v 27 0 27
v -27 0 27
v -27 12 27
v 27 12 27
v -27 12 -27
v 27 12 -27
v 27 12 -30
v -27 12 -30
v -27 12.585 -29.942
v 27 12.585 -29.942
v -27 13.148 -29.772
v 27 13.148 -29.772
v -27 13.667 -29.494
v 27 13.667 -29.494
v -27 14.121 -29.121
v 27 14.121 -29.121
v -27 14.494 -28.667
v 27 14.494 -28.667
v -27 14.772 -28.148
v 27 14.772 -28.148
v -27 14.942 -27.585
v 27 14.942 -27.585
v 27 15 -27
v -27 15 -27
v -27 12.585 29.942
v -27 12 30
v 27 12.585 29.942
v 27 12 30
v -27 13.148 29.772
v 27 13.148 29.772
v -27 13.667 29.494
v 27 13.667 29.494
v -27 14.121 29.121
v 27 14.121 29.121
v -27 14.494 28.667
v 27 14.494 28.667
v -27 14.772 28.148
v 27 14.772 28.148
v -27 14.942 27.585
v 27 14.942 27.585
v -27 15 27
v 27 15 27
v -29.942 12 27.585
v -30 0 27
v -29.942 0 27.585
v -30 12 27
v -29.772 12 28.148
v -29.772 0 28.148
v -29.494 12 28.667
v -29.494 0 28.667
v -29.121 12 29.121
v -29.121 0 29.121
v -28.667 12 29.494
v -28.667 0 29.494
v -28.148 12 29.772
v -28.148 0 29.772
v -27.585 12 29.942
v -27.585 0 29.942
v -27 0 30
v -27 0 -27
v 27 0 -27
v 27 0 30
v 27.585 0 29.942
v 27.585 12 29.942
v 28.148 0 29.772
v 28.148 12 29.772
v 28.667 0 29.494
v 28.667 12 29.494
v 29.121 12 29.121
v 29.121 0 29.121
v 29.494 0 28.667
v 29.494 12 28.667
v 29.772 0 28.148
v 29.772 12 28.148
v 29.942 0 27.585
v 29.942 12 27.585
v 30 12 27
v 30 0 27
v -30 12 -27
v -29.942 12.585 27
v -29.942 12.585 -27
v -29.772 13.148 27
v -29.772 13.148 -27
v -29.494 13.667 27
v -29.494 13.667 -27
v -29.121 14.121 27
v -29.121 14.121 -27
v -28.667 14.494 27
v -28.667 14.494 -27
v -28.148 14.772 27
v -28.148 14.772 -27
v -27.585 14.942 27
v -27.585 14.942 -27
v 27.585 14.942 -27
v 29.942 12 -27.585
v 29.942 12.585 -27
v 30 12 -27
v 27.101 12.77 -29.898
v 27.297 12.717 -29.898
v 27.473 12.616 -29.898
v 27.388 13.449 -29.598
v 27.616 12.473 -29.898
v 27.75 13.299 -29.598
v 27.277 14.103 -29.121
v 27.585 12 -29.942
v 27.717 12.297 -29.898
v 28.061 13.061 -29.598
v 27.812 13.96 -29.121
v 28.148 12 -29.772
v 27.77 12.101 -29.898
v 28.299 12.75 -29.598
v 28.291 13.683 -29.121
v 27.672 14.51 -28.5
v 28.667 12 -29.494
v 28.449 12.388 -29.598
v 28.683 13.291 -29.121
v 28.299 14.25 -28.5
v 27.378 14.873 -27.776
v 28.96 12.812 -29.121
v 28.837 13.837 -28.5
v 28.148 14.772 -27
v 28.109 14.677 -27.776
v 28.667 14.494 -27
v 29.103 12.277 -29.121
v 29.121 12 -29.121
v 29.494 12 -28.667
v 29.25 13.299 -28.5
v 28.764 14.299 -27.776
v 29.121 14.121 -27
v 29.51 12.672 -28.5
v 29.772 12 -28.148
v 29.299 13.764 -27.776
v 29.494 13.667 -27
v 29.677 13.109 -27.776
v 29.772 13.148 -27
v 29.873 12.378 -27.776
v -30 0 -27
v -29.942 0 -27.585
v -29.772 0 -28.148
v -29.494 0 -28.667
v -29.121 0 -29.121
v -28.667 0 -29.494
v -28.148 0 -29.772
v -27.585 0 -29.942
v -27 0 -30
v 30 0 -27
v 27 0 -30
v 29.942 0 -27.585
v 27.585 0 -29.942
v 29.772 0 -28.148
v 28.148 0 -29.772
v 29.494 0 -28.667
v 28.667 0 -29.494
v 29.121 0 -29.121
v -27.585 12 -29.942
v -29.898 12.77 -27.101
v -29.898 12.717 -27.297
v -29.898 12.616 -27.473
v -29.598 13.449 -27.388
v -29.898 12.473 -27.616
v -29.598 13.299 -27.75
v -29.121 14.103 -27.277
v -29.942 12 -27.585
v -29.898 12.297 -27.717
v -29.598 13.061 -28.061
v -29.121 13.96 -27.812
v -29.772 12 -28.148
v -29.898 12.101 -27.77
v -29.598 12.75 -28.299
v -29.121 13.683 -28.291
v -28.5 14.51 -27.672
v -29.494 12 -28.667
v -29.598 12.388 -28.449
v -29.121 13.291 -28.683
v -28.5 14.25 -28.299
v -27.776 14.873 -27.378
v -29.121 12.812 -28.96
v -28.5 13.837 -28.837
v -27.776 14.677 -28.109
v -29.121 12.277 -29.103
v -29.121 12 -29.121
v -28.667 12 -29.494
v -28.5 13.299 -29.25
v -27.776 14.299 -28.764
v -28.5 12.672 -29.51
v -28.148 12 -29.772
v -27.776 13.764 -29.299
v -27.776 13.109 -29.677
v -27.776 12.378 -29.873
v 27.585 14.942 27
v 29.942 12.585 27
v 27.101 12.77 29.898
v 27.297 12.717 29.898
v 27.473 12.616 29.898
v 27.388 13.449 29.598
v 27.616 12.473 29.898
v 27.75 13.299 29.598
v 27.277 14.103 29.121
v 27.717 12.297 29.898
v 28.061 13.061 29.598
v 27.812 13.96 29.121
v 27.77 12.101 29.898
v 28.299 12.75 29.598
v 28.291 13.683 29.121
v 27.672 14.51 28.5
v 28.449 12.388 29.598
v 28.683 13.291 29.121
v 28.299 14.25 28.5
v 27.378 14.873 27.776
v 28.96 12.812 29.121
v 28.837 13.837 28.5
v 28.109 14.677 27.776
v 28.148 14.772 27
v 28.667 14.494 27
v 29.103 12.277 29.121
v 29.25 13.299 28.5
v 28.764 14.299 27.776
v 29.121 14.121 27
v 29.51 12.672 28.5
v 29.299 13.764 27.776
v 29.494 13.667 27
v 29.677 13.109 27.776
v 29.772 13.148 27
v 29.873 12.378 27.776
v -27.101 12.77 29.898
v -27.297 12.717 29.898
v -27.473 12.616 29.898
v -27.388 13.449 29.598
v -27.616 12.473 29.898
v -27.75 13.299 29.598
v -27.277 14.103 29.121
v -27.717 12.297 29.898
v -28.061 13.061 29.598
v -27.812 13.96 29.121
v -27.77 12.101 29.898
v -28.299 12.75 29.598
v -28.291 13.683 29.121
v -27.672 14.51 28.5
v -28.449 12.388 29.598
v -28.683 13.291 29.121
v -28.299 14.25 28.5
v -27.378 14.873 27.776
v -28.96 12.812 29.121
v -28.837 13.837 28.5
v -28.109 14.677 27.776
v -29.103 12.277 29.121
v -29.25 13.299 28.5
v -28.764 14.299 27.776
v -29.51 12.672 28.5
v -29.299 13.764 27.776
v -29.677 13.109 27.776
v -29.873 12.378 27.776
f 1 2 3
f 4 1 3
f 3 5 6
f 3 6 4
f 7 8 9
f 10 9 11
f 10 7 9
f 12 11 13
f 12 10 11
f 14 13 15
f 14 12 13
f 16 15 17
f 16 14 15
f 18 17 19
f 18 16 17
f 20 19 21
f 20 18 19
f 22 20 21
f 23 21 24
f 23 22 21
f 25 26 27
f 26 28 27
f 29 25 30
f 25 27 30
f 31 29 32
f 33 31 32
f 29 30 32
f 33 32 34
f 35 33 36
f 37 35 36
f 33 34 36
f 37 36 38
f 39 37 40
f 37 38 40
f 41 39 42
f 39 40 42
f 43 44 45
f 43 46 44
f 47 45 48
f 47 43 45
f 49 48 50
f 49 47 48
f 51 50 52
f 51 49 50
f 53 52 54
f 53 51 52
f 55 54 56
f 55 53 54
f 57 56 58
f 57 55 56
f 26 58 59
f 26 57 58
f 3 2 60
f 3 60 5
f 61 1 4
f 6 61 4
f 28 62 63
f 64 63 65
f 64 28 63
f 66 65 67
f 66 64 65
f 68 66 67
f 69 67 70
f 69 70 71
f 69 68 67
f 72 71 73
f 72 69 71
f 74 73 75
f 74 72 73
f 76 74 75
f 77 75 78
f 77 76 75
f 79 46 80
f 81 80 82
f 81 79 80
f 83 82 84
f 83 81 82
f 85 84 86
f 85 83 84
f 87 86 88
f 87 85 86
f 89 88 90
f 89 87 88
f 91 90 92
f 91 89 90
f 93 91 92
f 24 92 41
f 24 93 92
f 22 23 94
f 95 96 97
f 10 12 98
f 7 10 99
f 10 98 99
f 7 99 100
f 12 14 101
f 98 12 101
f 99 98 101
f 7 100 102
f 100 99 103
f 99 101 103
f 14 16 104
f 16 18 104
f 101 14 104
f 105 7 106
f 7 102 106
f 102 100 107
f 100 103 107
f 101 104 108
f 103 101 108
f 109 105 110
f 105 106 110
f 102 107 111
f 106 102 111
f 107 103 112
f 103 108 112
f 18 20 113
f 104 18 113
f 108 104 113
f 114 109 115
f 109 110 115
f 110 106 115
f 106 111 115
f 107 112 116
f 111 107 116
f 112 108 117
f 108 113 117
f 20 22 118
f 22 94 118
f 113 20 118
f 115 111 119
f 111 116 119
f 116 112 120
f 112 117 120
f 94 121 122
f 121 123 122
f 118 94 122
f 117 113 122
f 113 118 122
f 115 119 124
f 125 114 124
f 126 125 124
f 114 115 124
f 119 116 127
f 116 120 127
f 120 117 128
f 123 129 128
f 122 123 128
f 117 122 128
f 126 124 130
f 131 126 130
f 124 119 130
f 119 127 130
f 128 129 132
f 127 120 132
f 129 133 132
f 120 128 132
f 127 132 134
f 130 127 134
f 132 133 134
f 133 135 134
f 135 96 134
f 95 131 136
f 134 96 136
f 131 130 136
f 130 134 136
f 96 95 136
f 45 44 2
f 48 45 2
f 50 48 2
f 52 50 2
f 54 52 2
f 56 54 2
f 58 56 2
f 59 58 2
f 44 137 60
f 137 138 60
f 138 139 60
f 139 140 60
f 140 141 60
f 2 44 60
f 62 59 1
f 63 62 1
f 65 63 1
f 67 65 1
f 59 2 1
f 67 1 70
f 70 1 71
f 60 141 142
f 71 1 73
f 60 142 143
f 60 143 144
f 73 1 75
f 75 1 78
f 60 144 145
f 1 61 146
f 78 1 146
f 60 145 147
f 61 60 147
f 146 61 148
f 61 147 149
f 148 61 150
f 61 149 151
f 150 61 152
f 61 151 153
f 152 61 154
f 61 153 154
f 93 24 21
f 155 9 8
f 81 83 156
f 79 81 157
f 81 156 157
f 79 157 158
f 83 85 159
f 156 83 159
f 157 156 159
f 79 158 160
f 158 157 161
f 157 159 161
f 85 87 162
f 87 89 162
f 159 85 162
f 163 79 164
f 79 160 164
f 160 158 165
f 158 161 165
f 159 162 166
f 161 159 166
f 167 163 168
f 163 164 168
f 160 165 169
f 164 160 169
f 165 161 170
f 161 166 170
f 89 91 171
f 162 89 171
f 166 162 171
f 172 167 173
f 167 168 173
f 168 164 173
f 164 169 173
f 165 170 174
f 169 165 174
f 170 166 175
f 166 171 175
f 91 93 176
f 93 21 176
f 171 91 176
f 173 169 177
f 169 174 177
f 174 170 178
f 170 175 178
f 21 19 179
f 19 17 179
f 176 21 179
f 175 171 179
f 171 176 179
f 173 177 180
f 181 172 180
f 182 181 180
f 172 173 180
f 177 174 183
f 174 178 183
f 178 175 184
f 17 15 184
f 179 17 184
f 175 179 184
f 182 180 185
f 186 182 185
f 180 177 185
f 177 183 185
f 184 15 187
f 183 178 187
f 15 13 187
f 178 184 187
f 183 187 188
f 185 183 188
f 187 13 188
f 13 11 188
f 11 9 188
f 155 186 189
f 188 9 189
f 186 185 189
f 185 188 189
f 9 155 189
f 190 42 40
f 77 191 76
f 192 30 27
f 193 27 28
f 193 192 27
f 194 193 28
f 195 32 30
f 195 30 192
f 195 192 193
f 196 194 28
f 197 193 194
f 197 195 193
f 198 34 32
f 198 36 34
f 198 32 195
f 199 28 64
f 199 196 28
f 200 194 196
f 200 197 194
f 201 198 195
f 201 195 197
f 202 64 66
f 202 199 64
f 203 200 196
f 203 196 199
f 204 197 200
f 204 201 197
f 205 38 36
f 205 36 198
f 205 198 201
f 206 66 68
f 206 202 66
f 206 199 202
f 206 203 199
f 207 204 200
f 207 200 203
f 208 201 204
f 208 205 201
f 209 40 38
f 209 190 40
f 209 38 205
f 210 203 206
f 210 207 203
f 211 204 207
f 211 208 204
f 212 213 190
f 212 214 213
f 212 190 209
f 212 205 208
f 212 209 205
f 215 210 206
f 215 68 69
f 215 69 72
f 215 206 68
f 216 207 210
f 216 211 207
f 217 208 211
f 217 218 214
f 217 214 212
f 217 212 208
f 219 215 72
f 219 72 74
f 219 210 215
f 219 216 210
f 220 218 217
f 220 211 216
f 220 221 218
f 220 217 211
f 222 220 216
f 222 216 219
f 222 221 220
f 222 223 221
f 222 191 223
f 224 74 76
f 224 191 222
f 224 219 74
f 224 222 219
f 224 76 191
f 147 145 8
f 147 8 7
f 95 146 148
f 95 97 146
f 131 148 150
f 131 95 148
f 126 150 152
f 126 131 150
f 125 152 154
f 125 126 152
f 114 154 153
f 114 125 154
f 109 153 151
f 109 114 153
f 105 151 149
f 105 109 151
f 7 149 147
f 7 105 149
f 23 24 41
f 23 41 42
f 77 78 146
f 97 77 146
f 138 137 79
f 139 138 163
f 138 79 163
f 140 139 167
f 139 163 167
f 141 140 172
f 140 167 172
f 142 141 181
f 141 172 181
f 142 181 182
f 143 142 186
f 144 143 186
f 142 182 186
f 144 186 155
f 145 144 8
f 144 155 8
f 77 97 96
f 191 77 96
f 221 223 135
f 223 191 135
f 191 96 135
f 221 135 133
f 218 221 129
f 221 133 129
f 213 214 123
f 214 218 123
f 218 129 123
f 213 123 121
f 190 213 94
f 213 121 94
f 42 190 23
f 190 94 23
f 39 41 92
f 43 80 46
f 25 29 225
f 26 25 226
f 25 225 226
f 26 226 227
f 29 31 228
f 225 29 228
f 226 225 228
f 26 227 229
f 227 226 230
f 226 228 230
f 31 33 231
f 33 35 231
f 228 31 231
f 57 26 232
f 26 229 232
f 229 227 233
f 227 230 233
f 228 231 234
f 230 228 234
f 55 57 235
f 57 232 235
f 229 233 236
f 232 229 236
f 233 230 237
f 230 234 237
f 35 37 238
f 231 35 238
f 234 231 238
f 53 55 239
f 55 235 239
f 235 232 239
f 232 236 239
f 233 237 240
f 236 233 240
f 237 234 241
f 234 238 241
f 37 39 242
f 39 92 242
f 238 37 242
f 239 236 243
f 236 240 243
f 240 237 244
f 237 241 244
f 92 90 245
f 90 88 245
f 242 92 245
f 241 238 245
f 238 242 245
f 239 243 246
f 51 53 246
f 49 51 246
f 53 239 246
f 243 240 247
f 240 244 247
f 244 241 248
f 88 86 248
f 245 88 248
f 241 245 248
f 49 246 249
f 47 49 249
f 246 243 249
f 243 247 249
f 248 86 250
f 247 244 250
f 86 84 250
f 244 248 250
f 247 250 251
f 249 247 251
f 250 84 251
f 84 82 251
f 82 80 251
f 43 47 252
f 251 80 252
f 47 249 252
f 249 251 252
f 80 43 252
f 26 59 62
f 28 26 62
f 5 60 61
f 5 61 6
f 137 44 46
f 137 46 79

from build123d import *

# Parameters (mm, degrees)
SKETCH1_W           = 60
SKETCH1_H           = 60
BOSS_EXTRUDE1_DEPTH = 15
FILLET1_R           = 3
SHELL1_START        = -27
SHELL1_OUTLINE_W    = 12
SHELL1_OUTLINE_H    = 54
SHELL1_DEPTH        = 54


# Read off the part's stored shape, not the designer's step: Shell1
with BuildPart() as part:
    # Sketch1 → Boss-Extrude1 (new body)
    with BuildSketch(Plane(origin=(0, 0, 0), x_dir=(1, 0, 0), z_dir=(0, 1, 0))):
        Rectangle(SKETCH1_W, SKETCH1_H)
    extrude(amount=BOSS_EXTRUDE1_DEPTH)

    # Fillet1
    fillet1_edges = [part.edges().sort_by_distance(p)[0] for p in [
        (30, 15, 0),
        (0, 15, -30),
        (-30, 15, 0),
        (0, 15, 30),
        (-30, 7.5, -30),
        (30, 7.5, -30),
        (30, 7.5, 30),
        (-30, 7.5, 30),
    ]]
    fillet(fillet1_edges, radius=FILLET1_R)

    # Shell1 outline → Shell1 (cut)
    with BuildSketch(Plane.YZ.offset(SHELL1_START)):
        with Locations((6, 0)):
            Rectangle(SHELL1_OUTLINE_W, SHELL1_OUTLINE_H)
    extrude(amount=SHELL1_DEPTH, mode=Mode.SUBTRACT)


solid = part.part
